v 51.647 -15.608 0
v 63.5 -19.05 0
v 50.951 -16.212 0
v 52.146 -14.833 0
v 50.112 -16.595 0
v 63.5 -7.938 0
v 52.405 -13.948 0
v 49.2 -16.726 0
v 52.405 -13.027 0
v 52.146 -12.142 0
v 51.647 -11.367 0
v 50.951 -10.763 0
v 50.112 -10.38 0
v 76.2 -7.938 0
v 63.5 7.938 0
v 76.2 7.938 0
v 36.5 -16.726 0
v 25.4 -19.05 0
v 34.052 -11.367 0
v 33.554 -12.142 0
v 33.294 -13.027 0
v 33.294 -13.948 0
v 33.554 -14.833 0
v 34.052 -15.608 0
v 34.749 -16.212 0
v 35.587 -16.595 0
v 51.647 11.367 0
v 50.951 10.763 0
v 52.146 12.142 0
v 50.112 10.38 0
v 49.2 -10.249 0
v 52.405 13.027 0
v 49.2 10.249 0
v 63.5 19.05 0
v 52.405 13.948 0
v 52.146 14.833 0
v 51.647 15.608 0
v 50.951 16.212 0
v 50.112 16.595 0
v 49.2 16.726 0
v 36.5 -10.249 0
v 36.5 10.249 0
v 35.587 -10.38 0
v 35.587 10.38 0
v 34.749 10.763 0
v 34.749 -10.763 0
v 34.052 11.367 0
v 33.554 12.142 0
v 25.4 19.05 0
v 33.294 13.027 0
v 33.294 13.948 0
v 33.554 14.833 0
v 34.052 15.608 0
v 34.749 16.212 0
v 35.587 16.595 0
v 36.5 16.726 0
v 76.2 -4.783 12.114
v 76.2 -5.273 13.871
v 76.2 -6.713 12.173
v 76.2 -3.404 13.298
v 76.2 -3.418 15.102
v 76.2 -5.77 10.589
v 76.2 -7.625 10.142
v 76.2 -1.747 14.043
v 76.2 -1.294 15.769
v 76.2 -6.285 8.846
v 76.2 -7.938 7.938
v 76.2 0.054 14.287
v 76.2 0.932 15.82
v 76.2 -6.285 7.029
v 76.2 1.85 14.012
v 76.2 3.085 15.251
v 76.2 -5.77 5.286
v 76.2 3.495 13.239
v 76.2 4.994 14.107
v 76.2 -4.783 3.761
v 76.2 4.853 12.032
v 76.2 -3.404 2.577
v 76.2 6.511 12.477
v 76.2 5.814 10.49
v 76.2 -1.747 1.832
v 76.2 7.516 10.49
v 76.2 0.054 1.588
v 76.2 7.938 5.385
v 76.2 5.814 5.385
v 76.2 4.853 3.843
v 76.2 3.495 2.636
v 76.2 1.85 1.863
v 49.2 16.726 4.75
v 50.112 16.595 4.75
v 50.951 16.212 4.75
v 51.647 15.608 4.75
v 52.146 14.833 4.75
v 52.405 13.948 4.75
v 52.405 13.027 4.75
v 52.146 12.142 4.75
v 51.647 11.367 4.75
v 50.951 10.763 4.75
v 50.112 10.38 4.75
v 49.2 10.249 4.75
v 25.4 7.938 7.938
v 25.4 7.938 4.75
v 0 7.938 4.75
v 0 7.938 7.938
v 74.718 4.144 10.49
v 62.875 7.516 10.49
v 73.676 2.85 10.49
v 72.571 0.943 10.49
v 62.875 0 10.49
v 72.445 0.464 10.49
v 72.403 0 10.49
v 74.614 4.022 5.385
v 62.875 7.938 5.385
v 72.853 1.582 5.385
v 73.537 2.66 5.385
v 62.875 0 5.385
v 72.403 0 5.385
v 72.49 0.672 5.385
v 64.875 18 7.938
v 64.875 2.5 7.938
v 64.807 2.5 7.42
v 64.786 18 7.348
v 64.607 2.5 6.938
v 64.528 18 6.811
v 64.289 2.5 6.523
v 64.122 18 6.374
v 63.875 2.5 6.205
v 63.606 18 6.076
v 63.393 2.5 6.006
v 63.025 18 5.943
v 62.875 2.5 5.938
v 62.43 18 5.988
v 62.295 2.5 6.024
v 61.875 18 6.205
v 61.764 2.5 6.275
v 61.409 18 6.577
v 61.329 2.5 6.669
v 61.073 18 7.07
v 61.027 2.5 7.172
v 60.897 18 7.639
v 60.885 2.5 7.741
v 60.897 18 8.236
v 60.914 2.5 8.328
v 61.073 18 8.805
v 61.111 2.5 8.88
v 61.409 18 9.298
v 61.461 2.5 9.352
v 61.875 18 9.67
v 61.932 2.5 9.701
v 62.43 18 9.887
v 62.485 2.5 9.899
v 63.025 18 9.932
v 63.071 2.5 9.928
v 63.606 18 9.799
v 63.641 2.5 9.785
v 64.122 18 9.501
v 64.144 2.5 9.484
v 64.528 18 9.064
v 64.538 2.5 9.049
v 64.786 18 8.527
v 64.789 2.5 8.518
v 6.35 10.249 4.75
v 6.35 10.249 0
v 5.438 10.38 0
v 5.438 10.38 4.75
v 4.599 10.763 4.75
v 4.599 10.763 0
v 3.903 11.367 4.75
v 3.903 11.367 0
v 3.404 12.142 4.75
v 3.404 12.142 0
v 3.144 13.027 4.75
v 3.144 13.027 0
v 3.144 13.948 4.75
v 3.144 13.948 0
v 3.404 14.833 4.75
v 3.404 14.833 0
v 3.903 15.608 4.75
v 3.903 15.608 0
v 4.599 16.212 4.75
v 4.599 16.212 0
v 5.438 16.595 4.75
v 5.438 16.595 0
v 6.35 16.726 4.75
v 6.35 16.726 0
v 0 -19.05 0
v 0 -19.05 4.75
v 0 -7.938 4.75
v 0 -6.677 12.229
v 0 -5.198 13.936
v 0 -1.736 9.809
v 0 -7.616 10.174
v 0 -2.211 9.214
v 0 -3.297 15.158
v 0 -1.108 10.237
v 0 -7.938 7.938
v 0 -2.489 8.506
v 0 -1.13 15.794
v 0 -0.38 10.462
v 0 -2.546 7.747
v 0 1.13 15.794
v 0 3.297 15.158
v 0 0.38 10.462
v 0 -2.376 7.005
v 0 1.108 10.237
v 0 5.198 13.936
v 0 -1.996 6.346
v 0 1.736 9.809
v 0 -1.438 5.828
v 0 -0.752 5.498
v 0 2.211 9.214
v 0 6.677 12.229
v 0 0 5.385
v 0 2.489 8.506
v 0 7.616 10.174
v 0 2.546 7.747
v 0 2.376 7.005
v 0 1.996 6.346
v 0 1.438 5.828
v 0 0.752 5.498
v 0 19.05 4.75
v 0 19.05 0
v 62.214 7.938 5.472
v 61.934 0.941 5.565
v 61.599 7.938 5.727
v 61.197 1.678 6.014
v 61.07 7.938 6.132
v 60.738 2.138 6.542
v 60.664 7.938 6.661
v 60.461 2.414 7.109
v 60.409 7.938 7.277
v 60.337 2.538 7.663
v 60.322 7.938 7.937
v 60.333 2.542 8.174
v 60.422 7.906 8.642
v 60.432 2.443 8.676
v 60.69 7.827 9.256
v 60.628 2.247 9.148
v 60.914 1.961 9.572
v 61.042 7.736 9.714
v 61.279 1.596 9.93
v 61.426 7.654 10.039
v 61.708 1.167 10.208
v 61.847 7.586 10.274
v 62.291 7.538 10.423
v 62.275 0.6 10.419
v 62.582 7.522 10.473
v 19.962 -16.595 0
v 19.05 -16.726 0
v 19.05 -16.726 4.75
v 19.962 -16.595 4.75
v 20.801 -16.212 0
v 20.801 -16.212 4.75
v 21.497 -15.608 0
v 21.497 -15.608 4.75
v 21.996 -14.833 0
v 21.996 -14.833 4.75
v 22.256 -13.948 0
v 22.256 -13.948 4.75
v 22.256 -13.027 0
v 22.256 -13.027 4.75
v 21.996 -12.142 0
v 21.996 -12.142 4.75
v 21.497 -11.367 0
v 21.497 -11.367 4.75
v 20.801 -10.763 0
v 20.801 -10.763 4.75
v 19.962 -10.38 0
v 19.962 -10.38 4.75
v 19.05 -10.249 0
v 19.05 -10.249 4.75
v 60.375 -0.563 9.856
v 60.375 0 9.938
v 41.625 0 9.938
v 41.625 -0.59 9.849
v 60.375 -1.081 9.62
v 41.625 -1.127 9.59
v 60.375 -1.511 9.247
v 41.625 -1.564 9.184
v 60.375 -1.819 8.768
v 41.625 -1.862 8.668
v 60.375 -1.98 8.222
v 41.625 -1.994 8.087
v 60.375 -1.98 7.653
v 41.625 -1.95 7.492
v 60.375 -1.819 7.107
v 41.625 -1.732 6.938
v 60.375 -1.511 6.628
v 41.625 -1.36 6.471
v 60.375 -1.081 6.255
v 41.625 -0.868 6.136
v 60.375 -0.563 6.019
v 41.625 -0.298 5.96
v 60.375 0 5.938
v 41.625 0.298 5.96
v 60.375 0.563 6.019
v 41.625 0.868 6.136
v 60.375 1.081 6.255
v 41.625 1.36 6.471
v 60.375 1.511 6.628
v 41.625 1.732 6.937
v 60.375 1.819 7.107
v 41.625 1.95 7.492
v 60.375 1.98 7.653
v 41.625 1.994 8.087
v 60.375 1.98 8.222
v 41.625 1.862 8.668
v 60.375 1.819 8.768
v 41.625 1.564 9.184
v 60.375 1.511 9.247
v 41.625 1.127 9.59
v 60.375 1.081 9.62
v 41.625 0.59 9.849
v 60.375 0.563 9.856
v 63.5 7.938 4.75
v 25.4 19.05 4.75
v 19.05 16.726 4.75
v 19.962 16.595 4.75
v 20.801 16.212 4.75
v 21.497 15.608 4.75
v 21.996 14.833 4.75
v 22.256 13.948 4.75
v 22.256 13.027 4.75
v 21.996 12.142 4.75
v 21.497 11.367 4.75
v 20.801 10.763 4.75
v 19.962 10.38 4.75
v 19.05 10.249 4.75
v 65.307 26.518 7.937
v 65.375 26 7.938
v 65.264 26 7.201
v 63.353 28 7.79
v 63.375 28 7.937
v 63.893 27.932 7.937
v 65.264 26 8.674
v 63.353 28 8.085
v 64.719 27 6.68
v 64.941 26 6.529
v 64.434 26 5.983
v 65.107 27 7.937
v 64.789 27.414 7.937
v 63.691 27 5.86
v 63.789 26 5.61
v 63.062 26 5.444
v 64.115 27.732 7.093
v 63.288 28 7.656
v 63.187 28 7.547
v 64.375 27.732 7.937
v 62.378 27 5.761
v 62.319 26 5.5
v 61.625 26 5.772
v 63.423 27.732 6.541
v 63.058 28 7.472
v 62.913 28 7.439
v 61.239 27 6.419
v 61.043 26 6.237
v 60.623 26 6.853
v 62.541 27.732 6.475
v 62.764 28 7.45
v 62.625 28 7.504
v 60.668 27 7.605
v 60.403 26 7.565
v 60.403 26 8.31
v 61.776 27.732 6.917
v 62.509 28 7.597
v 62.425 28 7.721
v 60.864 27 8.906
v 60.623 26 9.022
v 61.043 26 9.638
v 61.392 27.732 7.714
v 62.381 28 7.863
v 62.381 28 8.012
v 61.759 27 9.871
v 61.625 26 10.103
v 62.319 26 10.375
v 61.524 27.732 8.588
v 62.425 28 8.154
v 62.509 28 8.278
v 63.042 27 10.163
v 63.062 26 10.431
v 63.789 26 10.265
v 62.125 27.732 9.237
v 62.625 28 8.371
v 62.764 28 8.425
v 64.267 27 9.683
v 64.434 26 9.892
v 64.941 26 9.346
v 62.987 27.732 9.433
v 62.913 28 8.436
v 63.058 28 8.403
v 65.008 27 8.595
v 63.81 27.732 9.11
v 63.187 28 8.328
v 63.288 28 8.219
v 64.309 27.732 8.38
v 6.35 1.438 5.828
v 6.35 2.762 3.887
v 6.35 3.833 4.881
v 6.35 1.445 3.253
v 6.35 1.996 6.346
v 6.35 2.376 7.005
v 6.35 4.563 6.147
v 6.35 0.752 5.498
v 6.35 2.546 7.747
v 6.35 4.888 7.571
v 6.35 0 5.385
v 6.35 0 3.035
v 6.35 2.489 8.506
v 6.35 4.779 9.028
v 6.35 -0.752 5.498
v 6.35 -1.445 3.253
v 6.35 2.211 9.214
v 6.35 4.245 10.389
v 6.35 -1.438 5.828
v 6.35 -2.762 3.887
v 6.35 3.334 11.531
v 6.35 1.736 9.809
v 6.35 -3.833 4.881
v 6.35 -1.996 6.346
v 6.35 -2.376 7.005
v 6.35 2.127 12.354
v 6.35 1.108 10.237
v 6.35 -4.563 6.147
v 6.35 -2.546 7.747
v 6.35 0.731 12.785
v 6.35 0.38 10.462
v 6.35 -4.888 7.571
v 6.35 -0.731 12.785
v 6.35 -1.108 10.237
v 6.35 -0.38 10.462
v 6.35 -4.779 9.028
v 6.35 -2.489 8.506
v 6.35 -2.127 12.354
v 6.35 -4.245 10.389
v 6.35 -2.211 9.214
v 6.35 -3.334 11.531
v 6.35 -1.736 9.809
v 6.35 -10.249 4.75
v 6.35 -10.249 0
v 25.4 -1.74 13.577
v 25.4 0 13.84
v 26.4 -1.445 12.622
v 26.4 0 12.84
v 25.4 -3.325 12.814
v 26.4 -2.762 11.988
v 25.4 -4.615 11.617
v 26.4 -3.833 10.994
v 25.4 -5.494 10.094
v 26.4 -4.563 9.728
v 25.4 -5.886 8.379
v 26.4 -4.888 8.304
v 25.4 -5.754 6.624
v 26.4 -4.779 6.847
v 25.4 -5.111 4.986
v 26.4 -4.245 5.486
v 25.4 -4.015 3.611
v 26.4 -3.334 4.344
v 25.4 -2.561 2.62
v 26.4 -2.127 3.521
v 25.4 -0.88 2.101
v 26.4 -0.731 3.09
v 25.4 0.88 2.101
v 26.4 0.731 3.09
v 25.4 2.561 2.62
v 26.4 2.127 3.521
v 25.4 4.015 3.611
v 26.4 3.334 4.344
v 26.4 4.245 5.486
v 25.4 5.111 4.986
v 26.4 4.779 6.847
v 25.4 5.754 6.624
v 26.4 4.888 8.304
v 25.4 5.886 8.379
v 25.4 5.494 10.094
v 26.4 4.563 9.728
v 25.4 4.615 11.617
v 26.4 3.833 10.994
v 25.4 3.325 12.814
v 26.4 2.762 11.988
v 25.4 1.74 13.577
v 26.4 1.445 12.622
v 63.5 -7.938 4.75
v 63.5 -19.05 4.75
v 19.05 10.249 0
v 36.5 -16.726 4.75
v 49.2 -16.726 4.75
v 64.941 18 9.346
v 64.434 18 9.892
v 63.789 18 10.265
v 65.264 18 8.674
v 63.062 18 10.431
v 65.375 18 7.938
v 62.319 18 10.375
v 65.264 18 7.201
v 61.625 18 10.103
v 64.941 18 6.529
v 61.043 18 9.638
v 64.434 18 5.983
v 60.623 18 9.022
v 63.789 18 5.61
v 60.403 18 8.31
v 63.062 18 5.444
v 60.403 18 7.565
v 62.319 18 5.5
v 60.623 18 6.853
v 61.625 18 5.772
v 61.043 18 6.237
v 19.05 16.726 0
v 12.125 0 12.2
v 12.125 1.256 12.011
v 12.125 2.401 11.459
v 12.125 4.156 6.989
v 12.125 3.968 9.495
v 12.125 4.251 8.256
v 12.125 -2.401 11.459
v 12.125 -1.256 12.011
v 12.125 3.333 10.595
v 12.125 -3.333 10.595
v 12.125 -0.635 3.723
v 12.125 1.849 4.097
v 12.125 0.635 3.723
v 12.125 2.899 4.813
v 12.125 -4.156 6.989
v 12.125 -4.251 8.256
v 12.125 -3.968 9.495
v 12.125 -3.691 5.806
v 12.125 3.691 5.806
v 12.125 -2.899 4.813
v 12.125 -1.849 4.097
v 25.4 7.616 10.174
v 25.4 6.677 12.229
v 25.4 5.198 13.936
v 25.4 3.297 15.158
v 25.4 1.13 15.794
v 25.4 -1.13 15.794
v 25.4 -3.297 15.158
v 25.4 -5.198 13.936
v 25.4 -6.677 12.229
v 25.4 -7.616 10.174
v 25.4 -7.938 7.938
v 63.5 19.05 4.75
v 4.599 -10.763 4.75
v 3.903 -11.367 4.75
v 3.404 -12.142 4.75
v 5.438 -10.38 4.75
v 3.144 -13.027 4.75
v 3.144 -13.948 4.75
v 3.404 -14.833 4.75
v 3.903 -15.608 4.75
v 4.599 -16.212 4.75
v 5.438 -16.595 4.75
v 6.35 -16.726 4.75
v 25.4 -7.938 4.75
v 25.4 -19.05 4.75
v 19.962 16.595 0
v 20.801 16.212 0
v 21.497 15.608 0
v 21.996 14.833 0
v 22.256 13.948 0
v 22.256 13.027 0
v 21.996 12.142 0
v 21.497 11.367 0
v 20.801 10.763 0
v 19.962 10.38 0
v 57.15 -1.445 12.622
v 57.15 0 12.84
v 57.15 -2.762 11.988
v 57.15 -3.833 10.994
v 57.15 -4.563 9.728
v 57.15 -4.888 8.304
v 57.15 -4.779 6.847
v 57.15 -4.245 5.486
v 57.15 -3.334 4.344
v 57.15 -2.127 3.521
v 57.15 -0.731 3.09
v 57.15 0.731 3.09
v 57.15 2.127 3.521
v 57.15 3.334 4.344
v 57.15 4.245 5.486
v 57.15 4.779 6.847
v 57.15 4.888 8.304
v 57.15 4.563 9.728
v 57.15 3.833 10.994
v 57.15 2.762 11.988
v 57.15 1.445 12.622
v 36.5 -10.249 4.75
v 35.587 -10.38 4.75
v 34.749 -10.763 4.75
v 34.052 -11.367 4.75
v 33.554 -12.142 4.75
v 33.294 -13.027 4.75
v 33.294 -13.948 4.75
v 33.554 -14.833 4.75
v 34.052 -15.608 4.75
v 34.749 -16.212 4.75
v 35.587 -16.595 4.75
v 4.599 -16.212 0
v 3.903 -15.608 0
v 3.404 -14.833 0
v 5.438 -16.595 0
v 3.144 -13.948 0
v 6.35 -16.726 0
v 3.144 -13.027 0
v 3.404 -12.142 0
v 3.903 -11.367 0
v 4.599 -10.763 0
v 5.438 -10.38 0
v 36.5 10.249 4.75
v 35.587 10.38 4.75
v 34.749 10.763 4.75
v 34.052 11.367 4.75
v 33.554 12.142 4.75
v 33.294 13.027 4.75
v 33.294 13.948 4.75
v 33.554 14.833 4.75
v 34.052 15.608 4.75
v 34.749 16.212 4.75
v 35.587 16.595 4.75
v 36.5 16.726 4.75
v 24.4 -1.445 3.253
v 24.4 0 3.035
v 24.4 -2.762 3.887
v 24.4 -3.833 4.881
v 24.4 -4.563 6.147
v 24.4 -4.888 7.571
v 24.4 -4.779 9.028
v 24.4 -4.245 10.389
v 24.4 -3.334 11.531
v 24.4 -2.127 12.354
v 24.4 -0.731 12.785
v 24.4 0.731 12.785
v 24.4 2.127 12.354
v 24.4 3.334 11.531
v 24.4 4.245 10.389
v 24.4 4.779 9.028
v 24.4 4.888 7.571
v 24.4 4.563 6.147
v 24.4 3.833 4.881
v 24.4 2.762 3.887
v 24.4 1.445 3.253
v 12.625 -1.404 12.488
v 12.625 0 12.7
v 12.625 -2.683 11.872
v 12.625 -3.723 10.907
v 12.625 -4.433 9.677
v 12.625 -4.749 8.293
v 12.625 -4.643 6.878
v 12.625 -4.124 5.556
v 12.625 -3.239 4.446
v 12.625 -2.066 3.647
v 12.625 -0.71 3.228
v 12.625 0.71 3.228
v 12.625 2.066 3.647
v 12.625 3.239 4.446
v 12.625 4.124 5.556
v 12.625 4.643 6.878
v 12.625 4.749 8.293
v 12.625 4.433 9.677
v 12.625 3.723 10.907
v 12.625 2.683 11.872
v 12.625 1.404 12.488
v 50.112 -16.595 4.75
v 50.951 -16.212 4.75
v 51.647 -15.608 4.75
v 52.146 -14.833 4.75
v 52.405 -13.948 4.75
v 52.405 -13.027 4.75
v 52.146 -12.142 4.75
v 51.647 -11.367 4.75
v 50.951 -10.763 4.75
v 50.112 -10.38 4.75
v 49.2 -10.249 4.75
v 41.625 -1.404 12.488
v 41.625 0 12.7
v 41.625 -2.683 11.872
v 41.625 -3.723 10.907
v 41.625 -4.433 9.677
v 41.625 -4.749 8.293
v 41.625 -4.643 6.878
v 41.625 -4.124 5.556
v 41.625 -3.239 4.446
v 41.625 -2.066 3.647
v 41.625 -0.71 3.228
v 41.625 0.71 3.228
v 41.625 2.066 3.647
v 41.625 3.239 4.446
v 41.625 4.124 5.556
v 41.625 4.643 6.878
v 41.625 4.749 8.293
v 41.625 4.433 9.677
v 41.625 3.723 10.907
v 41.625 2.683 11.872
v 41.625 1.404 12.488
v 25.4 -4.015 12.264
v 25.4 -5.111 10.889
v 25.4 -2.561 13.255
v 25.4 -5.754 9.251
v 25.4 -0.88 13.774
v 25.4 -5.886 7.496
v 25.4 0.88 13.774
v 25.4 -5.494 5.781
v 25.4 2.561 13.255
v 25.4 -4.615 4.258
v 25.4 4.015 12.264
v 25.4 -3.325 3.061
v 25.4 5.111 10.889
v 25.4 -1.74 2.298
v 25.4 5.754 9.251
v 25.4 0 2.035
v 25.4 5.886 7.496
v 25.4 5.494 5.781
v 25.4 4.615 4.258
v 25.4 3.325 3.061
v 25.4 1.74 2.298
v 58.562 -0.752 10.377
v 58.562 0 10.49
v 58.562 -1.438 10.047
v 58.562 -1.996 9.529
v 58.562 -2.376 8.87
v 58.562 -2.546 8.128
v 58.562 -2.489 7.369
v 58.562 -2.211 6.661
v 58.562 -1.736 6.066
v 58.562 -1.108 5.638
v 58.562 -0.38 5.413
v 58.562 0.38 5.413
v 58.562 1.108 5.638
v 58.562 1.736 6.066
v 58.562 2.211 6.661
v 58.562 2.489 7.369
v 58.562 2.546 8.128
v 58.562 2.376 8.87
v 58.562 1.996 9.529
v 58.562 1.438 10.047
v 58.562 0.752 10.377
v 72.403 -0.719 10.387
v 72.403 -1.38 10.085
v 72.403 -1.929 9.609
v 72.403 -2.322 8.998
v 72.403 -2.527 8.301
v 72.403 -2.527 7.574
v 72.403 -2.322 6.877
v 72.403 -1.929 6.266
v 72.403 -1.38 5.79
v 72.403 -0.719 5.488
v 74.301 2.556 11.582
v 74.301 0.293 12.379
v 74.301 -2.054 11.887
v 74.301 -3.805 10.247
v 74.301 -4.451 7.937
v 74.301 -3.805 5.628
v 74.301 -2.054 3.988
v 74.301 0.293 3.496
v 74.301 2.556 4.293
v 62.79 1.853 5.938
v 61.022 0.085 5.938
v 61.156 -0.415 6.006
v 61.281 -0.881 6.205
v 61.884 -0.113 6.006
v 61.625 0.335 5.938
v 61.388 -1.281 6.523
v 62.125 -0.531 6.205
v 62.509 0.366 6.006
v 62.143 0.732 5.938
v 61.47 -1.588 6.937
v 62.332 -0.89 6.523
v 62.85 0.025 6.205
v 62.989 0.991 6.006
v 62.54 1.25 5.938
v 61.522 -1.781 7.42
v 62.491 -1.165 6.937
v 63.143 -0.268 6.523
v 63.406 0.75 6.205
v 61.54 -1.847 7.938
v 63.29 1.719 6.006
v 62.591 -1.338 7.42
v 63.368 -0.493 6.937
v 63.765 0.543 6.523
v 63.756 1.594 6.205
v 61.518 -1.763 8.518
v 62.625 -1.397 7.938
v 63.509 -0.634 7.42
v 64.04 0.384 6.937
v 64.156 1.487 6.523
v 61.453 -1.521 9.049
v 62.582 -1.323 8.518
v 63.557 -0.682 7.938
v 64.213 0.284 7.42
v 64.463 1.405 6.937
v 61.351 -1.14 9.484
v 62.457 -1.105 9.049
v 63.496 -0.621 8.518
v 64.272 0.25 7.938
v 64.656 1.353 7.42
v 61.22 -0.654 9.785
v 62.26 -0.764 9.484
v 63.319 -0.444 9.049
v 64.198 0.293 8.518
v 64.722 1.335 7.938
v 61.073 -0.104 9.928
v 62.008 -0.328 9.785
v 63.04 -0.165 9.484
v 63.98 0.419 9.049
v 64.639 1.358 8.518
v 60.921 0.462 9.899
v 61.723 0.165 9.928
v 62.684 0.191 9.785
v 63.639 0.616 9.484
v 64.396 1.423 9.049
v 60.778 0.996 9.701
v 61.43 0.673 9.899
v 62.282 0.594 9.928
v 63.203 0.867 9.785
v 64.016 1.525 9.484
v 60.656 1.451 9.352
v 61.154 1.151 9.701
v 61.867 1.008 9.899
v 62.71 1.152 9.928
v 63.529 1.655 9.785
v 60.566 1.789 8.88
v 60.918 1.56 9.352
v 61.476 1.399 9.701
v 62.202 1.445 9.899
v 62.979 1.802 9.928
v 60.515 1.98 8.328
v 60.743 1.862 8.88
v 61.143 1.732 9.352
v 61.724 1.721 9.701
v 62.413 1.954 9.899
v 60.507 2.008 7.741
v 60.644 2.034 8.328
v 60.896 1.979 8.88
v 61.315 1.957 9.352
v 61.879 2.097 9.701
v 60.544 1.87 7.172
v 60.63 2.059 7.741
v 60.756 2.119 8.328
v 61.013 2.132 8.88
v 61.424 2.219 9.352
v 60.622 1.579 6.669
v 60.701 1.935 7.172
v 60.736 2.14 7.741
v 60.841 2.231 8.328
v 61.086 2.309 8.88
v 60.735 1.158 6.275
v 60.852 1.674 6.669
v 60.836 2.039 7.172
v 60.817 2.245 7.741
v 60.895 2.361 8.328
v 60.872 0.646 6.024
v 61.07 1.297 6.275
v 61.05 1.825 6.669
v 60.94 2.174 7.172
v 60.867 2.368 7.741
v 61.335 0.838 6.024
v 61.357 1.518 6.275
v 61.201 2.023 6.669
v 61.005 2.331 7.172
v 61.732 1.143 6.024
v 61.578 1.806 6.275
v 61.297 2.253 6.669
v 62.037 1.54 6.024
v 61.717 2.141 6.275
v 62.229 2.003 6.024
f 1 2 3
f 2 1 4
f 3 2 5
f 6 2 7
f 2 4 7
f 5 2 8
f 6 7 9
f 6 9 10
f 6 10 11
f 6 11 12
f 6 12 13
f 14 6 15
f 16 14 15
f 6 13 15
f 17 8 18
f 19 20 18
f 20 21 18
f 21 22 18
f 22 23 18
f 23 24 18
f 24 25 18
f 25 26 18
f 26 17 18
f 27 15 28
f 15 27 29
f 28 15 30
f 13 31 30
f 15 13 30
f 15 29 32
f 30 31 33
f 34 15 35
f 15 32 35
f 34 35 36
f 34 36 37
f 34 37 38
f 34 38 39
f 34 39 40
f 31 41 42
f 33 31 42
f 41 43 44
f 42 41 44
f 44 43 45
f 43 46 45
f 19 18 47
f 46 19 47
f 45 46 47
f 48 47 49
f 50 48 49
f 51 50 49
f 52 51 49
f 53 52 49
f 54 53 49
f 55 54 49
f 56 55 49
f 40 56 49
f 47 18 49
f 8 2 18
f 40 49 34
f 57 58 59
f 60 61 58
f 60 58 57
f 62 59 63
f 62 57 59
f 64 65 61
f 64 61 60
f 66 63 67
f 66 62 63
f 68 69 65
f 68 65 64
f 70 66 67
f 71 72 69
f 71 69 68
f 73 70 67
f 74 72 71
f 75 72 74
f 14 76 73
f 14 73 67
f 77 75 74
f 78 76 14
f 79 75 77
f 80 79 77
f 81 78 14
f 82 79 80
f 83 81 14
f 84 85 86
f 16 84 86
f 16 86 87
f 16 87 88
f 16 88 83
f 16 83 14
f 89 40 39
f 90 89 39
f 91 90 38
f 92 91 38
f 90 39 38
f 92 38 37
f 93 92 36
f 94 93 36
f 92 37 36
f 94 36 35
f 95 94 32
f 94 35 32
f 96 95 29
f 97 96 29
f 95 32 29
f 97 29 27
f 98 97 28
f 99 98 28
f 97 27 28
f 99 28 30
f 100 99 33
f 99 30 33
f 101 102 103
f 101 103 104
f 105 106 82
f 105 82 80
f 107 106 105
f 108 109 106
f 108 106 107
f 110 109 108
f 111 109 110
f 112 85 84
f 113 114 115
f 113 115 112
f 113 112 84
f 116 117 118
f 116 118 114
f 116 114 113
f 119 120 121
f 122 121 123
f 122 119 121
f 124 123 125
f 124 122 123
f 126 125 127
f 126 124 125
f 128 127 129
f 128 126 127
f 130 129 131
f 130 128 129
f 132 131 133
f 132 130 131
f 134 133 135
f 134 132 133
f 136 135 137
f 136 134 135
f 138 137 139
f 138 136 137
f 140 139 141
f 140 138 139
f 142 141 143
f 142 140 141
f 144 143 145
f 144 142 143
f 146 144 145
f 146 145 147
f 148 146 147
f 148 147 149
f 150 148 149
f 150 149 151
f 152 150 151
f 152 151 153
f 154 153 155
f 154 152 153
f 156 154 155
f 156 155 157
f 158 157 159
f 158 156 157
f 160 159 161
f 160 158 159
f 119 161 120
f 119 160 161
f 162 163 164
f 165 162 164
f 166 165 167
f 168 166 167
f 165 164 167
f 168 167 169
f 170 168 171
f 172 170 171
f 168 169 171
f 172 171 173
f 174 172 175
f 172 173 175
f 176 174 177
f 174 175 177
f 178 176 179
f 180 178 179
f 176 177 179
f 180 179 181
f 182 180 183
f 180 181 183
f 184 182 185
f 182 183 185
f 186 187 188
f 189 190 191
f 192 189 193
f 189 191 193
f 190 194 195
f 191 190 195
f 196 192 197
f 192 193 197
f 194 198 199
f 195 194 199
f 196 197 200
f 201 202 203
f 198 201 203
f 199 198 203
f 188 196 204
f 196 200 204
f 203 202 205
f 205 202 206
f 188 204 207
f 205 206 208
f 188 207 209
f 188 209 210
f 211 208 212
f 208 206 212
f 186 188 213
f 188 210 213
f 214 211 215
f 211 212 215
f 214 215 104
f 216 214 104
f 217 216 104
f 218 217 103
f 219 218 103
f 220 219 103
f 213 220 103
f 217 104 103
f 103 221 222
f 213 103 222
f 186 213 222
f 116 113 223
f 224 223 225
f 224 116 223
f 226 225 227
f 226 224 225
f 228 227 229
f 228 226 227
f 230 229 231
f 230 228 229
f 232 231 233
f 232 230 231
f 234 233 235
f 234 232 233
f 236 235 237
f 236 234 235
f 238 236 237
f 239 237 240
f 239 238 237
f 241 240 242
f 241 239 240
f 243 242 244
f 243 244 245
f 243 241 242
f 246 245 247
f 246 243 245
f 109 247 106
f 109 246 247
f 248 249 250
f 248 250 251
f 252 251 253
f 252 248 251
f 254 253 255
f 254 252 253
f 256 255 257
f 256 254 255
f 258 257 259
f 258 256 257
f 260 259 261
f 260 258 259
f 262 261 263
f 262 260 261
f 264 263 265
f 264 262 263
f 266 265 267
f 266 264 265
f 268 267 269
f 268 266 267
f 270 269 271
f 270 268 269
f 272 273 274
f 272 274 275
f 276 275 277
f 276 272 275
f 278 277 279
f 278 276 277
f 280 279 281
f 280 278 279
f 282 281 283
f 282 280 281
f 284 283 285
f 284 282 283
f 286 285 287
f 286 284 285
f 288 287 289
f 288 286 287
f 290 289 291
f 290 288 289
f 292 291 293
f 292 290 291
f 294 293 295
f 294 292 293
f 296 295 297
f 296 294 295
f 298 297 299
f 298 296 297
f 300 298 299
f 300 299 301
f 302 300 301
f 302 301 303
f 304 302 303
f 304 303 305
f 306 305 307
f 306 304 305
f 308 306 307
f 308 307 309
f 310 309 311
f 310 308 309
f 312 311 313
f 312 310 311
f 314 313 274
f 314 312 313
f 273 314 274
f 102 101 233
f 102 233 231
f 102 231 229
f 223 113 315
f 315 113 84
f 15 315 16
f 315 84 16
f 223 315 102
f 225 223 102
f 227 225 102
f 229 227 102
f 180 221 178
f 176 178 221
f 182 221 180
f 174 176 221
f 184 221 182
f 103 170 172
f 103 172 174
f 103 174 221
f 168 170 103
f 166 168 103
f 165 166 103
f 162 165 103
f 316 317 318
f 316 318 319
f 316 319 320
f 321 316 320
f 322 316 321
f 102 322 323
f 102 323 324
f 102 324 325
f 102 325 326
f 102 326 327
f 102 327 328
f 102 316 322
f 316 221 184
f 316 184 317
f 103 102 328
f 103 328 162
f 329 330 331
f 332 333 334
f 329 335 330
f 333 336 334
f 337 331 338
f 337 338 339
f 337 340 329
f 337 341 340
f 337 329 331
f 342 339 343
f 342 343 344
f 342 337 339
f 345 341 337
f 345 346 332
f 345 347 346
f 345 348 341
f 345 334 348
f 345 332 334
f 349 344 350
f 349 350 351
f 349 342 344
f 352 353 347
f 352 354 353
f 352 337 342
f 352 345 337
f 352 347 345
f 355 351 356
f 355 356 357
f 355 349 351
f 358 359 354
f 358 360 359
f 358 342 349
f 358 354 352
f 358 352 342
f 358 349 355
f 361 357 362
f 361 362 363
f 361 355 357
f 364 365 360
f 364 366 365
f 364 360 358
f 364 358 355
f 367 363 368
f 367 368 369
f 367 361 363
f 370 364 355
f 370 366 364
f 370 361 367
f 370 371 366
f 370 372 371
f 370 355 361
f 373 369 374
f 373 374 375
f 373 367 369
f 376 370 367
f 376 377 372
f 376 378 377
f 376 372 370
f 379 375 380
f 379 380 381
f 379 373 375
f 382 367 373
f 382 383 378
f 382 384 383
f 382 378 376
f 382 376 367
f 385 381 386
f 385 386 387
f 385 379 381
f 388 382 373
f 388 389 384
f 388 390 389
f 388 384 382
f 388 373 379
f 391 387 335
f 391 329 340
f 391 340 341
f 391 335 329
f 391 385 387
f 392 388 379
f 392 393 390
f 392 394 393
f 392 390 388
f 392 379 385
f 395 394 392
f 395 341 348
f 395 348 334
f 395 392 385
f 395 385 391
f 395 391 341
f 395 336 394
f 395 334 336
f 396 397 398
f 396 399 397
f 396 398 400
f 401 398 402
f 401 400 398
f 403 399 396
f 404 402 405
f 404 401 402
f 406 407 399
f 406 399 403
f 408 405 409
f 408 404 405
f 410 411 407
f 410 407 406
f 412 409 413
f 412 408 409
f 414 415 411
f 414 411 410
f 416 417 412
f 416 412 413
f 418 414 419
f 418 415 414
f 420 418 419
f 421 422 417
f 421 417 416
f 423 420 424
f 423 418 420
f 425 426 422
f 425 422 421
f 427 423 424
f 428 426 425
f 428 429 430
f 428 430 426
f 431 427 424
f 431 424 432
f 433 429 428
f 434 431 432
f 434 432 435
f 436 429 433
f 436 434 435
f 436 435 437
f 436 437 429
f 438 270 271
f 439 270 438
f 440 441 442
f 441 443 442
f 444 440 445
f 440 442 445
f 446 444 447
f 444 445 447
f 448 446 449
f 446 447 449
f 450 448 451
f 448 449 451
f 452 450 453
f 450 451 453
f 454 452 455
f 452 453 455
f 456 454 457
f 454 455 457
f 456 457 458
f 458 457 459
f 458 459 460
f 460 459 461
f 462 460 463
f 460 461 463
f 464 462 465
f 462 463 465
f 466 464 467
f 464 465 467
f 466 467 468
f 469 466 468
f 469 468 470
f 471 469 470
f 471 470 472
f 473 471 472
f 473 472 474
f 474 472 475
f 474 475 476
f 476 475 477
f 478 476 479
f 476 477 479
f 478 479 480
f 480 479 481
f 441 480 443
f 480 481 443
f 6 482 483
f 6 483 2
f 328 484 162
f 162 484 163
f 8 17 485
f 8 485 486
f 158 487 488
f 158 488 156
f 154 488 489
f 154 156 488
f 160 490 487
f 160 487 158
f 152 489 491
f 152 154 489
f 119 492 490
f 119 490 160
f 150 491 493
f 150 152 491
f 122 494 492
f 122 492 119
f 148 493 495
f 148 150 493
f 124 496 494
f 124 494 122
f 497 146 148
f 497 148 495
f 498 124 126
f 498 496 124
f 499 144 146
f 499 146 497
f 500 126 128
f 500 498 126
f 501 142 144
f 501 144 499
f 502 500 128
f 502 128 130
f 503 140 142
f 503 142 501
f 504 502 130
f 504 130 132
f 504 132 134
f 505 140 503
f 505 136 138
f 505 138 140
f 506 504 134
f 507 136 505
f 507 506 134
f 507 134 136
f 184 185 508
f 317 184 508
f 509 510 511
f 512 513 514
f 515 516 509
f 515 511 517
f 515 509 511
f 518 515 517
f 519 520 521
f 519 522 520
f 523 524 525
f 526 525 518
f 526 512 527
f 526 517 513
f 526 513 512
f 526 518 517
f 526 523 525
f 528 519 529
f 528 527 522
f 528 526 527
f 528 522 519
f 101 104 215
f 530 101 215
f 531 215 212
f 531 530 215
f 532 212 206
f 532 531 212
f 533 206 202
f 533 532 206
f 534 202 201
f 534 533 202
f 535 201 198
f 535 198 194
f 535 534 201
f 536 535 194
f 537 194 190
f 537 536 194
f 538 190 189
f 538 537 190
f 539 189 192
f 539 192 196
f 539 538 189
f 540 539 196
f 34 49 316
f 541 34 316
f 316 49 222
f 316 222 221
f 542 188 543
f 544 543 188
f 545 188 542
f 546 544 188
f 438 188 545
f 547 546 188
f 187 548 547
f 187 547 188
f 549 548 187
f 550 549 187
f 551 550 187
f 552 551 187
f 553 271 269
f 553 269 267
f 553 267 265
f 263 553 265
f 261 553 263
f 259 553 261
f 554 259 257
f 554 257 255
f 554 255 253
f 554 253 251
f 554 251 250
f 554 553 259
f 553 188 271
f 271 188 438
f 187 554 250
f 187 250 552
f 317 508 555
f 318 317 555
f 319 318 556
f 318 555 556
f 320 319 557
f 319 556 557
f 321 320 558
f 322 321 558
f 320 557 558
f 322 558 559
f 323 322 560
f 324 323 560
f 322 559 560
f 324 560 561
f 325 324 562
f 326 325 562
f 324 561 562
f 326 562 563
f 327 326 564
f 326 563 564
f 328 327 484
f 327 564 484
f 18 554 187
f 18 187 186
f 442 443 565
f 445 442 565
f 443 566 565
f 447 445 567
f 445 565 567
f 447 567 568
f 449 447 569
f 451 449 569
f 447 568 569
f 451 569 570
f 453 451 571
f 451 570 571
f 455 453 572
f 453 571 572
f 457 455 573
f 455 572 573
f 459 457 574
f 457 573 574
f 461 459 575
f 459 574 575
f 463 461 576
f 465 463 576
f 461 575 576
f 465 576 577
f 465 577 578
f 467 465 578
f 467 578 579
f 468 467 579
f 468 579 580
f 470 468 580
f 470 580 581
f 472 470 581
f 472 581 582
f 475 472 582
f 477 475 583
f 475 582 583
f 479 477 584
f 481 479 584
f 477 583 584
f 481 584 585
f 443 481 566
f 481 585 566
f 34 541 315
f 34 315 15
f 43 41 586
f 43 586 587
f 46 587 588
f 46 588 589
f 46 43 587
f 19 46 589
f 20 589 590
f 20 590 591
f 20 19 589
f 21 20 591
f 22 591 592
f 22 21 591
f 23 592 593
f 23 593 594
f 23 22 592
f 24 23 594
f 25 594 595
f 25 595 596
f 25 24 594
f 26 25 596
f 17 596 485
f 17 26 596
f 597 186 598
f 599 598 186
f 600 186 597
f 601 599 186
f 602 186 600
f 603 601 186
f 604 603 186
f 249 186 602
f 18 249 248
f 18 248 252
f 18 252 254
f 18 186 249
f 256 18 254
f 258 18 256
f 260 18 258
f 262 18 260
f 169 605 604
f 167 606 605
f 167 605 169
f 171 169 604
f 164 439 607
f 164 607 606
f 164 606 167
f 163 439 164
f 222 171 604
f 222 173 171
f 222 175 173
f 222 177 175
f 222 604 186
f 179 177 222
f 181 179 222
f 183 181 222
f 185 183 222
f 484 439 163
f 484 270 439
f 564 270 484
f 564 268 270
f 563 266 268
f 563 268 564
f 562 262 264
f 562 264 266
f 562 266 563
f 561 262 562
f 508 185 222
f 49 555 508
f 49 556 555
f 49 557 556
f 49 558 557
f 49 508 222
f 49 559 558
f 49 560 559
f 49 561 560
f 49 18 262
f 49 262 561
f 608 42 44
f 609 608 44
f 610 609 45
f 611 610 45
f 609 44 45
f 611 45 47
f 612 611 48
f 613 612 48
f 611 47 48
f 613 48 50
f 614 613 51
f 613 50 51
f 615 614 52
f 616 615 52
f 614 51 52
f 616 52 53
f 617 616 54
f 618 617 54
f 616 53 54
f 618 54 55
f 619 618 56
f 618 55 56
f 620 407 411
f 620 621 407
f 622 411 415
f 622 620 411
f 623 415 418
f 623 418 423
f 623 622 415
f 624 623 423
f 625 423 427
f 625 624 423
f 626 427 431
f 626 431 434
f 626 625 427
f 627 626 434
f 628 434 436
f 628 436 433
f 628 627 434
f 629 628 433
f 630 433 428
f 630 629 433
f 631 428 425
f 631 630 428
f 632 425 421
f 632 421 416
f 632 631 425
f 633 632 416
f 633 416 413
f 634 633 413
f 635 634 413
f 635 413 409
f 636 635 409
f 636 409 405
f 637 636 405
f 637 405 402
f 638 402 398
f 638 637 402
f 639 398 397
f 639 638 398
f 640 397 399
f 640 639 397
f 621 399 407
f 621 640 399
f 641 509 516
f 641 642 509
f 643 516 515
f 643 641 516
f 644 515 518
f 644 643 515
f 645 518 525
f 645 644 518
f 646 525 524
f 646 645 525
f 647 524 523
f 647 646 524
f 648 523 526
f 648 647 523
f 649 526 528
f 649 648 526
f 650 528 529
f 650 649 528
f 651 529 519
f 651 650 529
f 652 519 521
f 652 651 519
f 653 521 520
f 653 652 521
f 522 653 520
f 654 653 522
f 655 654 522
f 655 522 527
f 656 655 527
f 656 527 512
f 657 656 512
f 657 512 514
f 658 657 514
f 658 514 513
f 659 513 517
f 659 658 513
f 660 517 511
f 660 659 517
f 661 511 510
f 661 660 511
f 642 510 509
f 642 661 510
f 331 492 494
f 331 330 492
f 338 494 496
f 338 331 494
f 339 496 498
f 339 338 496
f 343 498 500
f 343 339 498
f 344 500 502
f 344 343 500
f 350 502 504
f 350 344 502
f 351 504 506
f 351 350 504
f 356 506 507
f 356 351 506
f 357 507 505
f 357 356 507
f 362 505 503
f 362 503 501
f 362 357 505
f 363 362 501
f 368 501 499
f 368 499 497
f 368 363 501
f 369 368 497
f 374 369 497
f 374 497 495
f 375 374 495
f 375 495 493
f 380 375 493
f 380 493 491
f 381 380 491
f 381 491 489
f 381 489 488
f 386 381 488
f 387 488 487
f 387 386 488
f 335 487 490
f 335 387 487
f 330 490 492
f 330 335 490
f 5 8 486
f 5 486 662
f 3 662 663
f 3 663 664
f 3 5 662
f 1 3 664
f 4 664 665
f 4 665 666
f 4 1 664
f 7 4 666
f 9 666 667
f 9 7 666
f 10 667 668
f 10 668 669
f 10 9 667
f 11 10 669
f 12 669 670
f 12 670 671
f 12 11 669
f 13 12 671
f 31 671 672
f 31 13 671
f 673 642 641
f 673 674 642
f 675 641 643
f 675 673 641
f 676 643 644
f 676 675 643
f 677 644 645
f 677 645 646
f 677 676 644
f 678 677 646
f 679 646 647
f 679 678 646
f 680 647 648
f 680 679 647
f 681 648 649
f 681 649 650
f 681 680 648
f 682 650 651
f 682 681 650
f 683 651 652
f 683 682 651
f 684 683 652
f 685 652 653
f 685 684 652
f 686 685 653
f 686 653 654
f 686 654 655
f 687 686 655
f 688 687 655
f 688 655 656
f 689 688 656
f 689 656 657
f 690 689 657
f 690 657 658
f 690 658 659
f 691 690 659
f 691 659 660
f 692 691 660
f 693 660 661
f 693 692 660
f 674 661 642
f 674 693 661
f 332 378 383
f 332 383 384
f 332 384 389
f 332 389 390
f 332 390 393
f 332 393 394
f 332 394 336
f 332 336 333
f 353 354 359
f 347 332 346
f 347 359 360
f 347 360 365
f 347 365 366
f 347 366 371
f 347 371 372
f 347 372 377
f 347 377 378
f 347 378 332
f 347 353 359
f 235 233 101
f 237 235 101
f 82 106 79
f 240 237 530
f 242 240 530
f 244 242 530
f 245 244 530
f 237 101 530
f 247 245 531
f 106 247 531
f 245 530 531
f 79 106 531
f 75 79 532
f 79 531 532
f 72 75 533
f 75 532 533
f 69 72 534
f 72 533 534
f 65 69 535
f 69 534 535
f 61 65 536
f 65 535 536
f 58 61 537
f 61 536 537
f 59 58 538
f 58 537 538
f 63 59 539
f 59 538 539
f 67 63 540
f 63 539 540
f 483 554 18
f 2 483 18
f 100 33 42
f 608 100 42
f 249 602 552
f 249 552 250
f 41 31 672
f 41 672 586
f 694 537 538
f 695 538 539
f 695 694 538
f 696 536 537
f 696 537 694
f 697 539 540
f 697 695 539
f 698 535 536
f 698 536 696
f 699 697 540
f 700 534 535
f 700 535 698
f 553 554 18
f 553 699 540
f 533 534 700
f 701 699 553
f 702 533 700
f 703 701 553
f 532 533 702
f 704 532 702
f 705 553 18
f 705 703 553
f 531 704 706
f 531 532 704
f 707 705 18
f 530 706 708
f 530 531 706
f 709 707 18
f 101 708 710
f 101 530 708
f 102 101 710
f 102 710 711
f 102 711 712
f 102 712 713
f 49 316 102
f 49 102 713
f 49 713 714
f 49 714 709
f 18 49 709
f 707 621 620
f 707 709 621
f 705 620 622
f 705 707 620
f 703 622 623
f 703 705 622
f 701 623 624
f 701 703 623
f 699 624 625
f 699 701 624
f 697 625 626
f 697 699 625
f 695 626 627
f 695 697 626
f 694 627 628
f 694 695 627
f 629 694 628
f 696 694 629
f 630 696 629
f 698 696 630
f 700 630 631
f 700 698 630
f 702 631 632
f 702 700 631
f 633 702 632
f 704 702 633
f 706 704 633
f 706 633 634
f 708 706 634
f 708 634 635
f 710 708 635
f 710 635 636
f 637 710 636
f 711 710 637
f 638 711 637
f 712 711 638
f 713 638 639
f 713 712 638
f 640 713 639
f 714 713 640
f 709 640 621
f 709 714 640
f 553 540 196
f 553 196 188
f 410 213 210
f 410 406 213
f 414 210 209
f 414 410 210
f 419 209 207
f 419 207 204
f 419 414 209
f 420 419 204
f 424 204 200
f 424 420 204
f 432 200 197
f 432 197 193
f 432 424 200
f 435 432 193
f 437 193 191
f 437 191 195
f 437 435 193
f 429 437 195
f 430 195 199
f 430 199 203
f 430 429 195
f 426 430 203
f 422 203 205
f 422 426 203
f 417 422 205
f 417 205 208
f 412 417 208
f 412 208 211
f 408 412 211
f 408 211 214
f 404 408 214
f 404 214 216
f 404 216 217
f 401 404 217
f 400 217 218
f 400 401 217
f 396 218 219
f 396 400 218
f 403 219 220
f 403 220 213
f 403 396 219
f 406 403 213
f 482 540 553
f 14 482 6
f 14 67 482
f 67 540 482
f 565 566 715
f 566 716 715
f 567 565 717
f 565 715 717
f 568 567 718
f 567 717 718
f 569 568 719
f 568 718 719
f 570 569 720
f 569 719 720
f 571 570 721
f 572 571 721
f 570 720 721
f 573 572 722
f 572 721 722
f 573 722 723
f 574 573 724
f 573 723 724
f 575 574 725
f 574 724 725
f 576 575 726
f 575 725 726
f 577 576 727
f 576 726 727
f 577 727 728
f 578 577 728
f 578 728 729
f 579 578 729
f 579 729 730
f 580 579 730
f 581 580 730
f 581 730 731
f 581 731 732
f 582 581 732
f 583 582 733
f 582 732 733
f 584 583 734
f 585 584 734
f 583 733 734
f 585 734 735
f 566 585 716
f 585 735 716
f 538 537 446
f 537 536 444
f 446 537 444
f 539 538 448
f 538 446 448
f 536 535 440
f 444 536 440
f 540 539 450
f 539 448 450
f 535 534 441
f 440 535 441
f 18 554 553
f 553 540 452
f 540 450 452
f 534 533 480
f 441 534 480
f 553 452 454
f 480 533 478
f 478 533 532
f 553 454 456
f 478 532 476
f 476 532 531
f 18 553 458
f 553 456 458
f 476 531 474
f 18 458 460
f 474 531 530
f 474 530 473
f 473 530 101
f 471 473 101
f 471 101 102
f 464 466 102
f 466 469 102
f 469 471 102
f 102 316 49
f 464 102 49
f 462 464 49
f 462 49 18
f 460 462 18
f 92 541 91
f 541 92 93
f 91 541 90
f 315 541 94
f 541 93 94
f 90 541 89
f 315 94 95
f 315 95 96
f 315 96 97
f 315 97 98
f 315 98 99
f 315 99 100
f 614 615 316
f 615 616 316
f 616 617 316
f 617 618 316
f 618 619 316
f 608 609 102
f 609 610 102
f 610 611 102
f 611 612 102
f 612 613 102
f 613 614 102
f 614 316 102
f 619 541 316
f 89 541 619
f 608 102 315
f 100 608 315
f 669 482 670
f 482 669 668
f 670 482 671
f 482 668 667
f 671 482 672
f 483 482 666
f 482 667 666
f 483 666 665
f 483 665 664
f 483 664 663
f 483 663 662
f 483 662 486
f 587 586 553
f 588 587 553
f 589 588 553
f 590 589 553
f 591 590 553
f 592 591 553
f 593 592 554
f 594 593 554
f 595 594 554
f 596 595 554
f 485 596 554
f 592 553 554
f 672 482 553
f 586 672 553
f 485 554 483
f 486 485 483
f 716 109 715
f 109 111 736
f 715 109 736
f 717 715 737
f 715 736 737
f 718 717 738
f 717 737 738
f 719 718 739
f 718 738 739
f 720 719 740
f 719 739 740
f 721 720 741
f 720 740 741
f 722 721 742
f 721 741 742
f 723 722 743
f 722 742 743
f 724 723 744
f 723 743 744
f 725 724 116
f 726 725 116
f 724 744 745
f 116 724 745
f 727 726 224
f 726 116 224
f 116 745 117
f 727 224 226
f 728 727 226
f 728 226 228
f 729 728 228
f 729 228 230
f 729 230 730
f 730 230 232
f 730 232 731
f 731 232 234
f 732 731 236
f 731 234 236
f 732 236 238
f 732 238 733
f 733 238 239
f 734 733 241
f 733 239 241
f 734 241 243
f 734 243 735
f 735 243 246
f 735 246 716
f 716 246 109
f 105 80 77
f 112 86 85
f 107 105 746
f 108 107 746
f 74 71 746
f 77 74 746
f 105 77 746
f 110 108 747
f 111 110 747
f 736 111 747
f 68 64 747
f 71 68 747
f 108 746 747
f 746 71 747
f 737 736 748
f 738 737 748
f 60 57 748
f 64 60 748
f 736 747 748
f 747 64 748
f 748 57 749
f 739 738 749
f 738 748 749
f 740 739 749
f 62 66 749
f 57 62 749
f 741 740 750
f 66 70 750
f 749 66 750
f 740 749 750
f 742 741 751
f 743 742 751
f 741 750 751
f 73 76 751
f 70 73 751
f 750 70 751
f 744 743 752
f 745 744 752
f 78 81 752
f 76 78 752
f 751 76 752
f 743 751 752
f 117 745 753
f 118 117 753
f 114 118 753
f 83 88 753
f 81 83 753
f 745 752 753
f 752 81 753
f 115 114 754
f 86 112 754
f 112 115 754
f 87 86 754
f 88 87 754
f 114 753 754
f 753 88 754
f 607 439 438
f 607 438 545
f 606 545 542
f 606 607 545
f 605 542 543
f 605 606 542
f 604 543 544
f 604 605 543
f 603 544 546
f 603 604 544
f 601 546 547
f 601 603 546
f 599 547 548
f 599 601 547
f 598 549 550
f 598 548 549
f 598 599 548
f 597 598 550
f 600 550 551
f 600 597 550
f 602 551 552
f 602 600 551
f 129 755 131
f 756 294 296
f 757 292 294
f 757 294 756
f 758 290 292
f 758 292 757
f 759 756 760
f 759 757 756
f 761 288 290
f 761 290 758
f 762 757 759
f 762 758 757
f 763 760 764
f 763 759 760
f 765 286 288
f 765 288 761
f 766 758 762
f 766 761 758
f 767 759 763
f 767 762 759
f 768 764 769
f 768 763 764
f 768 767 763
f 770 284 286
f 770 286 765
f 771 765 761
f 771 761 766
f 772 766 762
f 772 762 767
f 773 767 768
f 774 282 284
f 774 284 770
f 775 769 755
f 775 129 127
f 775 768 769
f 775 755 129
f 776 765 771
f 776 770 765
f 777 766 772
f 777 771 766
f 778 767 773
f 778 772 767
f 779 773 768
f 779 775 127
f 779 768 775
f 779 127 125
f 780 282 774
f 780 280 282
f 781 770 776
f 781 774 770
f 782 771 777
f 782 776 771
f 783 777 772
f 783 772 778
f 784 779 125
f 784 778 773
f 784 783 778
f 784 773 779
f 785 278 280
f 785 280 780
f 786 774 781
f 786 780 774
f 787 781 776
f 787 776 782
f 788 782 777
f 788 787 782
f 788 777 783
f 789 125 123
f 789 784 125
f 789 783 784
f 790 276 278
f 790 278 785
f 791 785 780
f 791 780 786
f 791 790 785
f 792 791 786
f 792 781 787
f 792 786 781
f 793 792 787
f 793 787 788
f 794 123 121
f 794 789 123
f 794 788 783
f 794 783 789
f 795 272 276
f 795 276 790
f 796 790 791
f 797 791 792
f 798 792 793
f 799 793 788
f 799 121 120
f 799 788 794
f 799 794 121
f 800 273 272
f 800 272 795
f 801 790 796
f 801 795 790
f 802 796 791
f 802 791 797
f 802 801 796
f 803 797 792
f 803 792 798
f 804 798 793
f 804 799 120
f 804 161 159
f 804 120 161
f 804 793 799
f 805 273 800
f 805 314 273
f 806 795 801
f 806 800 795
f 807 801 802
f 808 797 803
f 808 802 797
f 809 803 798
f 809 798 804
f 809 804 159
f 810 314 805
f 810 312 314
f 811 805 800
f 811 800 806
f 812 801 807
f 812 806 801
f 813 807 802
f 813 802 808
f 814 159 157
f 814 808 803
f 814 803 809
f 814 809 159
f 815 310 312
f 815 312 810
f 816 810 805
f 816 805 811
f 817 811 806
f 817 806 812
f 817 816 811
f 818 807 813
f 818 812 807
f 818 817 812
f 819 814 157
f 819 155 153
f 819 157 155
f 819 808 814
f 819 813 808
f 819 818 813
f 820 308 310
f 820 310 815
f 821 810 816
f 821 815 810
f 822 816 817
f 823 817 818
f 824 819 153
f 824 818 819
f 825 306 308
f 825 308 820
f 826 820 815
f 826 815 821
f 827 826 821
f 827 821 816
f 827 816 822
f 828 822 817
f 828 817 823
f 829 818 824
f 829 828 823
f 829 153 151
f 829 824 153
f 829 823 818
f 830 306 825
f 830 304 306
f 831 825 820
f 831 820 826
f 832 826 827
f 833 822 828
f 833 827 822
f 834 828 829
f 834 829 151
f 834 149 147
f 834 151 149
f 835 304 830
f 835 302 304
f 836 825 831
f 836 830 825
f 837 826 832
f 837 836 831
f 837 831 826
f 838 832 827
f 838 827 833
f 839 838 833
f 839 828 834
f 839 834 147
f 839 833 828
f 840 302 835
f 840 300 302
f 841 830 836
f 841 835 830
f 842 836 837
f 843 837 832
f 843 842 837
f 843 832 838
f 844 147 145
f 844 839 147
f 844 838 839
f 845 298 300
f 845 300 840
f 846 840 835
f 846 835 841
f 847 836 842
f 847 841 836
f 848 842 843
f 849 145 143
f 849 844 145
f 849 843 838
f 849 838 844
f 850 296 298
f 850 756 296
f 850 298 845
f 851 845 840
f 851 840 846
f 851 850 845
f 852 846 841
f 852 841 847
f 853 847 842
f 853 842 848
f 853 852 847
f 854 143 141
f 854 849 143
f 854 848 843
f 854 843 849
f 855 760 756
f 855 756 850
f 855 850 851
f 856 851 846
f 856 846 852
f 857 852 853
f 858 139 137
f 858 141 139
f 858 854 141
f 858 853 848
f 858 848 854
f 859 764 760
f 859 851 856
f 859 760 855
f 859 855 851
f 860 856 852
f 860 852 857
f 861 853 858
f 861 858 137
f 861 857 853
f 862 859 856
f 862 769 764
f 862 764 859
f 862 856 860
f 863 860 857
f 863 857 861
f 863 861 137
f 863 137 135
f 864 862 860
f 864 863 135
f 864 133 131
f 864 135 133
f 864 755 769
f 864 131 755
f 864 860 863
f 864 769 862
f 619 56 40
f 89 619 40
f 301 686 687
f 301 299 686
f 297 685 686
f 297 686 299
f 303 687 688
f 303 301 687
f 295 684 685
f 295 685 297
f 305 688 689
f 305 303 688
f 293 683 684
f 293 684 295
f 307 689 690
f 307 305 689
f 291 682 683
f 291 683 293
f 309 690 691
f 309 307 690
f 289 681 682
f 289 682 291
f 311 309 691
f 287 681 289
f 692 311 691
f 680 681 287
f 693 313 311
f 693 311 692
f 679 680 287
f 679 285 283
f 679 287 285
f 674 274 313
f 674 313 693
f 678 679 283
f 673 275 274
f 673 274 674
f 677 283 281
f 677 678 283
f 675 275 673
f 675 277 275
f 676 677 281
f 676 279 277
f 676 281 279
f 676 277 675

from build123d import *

# Parameters (mm, degrees)
BOSS_EXTRUDE1_DEPTH = 25.4
CUT_EXTRUDE2_REACH  = 37.498
BOSS_EXTRUDE2_DEPTH = 50.8
SKETCH5_W           = 4.7498
SKETCH5_H           = 11.1125
CUT_EXTRUDE3_DEPTH  = 12.7
CUT_EXTRUDE4_DEPTH  = 7.9375
CUT_EXTRUDE5_DEPTH  = 4.7498
SKETCH12_R          = 2


with BuildPart() as part:
    # Sketch1 → Boss-Extrude1 (new body)
    with BuildSketch(Plane(origin=(0, 0, 0), x_dir=(0, 0, -1), z_dir=(1, 0, 0))):
        with BuildLine():
            Line((0, -19.05), (0, 19.05))
            Line((0, 19.05), (-4.7498, 19.05))
            Line((-4.7498, 19.05), (-4.7498, 7.9375))
            Line((-4.7498, 7.9375), (-7.9375, 7.9375))
            ThreePointArc((-7.9375, 7.9375), (-15.875, 0), (-7.9375, -7.9375))
            Line((-7.9375, -7.9375), (-4.7498, -7.9375))
            Line((-4.7498, -7.9375), (-4.7498, -19.05))
            Line((-4.7498, -19.05), (0, -19.05))
        make_face()
    extrude(amount=-BOSS_EXTRUDE1_DEPTH)

    # Sketch2 → Cut-Revolve1 (revolve, cut)
    with BuildSketch(Plane(origin=(0, 0, 0), x_dir=(1, 0, 0), z_dir=(0, 1, 0)), mode=Mode.PRIVATE) as cut_revolve1_sk:
        Polygon((-25.4, -7.9375), (-25.4, -10.4902), (-19.05, -10.4902), (-19.05, -12.8397), (-1, -12.8397), (0, -13.8397), (0, -7.9375), align=None)
    revolve(cut_revolve1_sk.sketch.rotate(Axis((0, 0, 7.9375), (-1, 0, 0)), 180), axis=Axis((0, 0, 7.9375), (-1, 0, 0)), mode=Mode.SUBTRACT)

    # Sketch3 → Cut-Extrude2 (cut, up to next)
    with BuildSketch(Plane.XY, mode=Mode.PRIVATE) as cut_extrude2_sk1:
        with BuildLine():
            Line((-19.05, 16.7259), (-6.35, 16.7259))
            ThreePointArc((-6.35, 16.7259), (-3.1115, 13.4874), (-6.35, 10.2489))
            Line((-6.35, 10.2489), (-19.05, 10.2489))
            ThreePointArc((-19.05, 10.2489), (-22.2885, 13.4874), (-19.05, 16.7259))
        make_face()
    cut_extrude2_tool1 = extrude(cut_extrude2_sk1.sketch, amount=CUT_EXTRUDE2_REACH, mode=Mode.PRIVATE) & part.part
    # Sketch3 → Cut-Extrude2 (cut, up to next)
    with BuildSketch(Plane.XY, mode=Mode.PRIVATE) as cut_extrude2_sk2:
        with BuildLine():
            Line((-19.05, -16.7259), (-6.35, -16.7259))
            ThreePointArc((-6.35, -16.7259), (-3.1115, -13.4874), (-6.35, -10.2489))
            Line((-6.35, -10.2489), (-19.05, -10.2489))
            ThreePointArc((-19.05, -10.2489), (-22.2885, -13.4874), (-19.05, -16.7259))
        make_face()
    cut_extrude2_tool2 = extrude(cut_extrude2_sk2.sketch, amount=CUT_EXTRUDE2_REACH, mode=Mode.PRIVATE) & part.part
    add(cut_extrude2_tool1.solids().sort_by_distance((-12.7, 13.4874, 0))[0], mode=Mode.SUBTRACT)
    add(cut_extrude2_tool2.solids().sort_by_distance((-12.7, -13.4874, 0))[0], mode=Mode.SUBTRACT)


with BuildPart() as body_2:
    # Sketch4 → Boss-Extrude2 (new body)
    with BuildSketch(Plane(origin=(25.4, 0, 0), x_dir=(0, 0, -1), z_dir=(1, 0, 0))):
        with BuildLine():
            Line((0, -19.05), (0, 19.05))
            Line((0, 19.05), (-4.7498, 19.05))
            Line((-4.7498, 19.05), (-4.7498, 7.9375))
            Line((-4.7498, 7.9375), (-7.9375, 7.9375))
            ThreePointArc((-7.9375, 7.9375), (-15.875, 0), (-7.9375, -7.9375))
            Line((-7.9375, -7.9375), (-4.7498, -7.9375))
            Line((-4.7498, -7.9375), (-4.7498, -19.05))
            Line((-4.7498, -19.05), (0, -19.05))
        make_face()
    extrude(amount=BOSS_EXTRUDE2_DEPTH)

    # Sketch5 → Cut-Extrude3 (cut)
    with BuildSketch(Plane(origin=(76.2, 0, 0), x_dir=(0, 0, -1), z_dir=(1, 0, 0))):
        with Locations((-2.3749, 13.49375)):
            Rectangle(SKETCH5_W, SKETCH5_H)
        with Locations((-2.3749, -13.49375)):
            Rectangle(SKETCH5_W, SKETCH5_H)
    extrude(amount=-CUT_EXTRUDE3_DEPTH, mode=Mode.SUBTRACT)

    # Sketch6 → Cut-Revolve2 (revolve, cut)
    with BuildSketch(Plane(origin=(0, 0, 0), x_dir=(1, 0, 0), z_dir=(0, 1, 0))):
        Polygon((25.4, -7.9375), (25.4, -13.8397), (26.4, -12.8397), (57.15, -12.8397), (58.561722024, -10.4902), (72.4027, -10.4902), (76.2, -14.2875), (76.2, -7.9375), align=None)
    revolve(axis=Axis((25.4, 0, 7.9375), (1, 0, 0)), mode=Mode.SUBTRACT)

    # Sketch7 → Cut-Extrude4 (cut)
    with BuildSketch(Plane(origin=(0, 0, 0), x_dir=(1, 0, 0), z_dir=(0, 1, 0))):
        with BuildLine():
            Line((62.87516, -10.4902), (76.2, -10.4902))
            Line((76.2, -10.4902), (76.2, -5.3848))
            Line((76.2, -5.3848), (62.87516, -5.3848))
            ThreePointArc((62.87516, -5.3848), (60.32246, -7.9375), (62.87516, -10.4902))
        make_face()
    extrude(amount=CUT_EXTRUDE4_DEPTH, mode=Mode.SUBTRACT)

    # Sketch8 → Cut-Extrude5 (cut)
    with BuildSketch(Plane.XY):
        with BuildLine():
            Line((36.4998, 16.7259), (49.1998, 16.7259))
            ThreePointArc((49.1998, 16.7259), (52.4383, 13.4874), (49.1998, 10.2489))
            Line((49.1998, 10.2489), (36.4998, 10.2489))
            ThreePointArc((36.4998, 10.2489), (33.2613, 13.4874), (36.4998, 16.7259))
        make_face()
        with BuildLine():
            Line((36.4998, -16.7259), (49.1998, -16.7259))
            ThreePointArc((49.1998, -16.7259), (52.4383, -13.4874), (49.1998, -10.2489))
            Line((49.1998, -10.2489), (36.4998, -10.2489))
            ThreePointArc((36.4998, -10.2489), (33.2613, -13.4874), (36.4998, -16.7259))
        make_face()
    extrude(amount=CUT_EXTRUDE5_DEPTH, mode=Mode.SUBTRACT)


with BuildPart() as body_3:
    # Sketch9 → Revolve1 (revolve)
    with BuildSketch(Plane.XY.offset(7.9375), mode=Mode.PRIVATE) as revolve1_sk:
        Polygon((12.12516, 0), (12.12516, 4.2625), (12.62516, 4.7625), (41.62516, 4.7625), (41.62516, 2), (60.37516, 2), (60.37516, 0), align=None)
    revolve(revolve1_sk.sketch.rotate(Axis((12.12516, 0, 7.9375), (1, 0, 0)), 90), axis=Axis((12.12516, 0, 7.9375), (1, 0, 0)))



with BuildPart() as body_4:
    # Sketch11 → Revolve2 (revolve)
    with BuildSketch(Plane.XY.offset(7.9375), mode=Mode.PRIVATE) as revolve2_sk:
        with BuildLine():
            Line((60.87516, 2.5), (60.87516, 18))
            Line((60.87516, 18), (60.37516, 18))
            Line((60.37516, 18), (60.37516, 26))
            ThreePointArc((60.37516, 26), (60.960946438, 27.414213562), (62.37516, 28))
            Line((62.37516, 28), (62.87516, 28))
            Line((62.87516, 28), (62.87516, 2.5))
            Line((62.87516, 2.5), (60.87516, 2.5))
        make_face()
    revolve(revolve2_sk.sketch.rotate(Axis((62.87516, 2.5, 7.9375), (0, 1, 0)), 180), axis=Axis((62.87516, 2.5, 7.9375), (0, 1, 0)))


with BuildPart() as body_3_1:
    add(body_3.part)

    add(body_4.part)  # Sweep1 merges body 4
    # Sweep1: sweep along a path in Sketch13
    with BuildLine(Plane.XY.offset(7.9375)) as sweep1_path:
        ThreePointArc((60.37516, 0), (62.142926953, 0.732233047), (62.87516, 2.5))
    # Sketch12 → Sweep1 (sweep)
    with BuildSketch(Plane(origin=(60.37516, 0, 0), x_dir=(0, 0, -1), z_dir=(1, 0, 0))):
        with Locations((-7.9375, 0)):
            Circle(SKETCH12_R)
    sweep(path=sweep1_path.line)


with BuildPart() as part_1:
    # Body-Move/Copy1: read off the stored shape, not the designer's step
    # Body-Move/Copy1: moved
    add(part.part.moved(Location((25.4, 0, 0))))


solid = Compound([body_2.part, body_3_1.part, part_1.part])
